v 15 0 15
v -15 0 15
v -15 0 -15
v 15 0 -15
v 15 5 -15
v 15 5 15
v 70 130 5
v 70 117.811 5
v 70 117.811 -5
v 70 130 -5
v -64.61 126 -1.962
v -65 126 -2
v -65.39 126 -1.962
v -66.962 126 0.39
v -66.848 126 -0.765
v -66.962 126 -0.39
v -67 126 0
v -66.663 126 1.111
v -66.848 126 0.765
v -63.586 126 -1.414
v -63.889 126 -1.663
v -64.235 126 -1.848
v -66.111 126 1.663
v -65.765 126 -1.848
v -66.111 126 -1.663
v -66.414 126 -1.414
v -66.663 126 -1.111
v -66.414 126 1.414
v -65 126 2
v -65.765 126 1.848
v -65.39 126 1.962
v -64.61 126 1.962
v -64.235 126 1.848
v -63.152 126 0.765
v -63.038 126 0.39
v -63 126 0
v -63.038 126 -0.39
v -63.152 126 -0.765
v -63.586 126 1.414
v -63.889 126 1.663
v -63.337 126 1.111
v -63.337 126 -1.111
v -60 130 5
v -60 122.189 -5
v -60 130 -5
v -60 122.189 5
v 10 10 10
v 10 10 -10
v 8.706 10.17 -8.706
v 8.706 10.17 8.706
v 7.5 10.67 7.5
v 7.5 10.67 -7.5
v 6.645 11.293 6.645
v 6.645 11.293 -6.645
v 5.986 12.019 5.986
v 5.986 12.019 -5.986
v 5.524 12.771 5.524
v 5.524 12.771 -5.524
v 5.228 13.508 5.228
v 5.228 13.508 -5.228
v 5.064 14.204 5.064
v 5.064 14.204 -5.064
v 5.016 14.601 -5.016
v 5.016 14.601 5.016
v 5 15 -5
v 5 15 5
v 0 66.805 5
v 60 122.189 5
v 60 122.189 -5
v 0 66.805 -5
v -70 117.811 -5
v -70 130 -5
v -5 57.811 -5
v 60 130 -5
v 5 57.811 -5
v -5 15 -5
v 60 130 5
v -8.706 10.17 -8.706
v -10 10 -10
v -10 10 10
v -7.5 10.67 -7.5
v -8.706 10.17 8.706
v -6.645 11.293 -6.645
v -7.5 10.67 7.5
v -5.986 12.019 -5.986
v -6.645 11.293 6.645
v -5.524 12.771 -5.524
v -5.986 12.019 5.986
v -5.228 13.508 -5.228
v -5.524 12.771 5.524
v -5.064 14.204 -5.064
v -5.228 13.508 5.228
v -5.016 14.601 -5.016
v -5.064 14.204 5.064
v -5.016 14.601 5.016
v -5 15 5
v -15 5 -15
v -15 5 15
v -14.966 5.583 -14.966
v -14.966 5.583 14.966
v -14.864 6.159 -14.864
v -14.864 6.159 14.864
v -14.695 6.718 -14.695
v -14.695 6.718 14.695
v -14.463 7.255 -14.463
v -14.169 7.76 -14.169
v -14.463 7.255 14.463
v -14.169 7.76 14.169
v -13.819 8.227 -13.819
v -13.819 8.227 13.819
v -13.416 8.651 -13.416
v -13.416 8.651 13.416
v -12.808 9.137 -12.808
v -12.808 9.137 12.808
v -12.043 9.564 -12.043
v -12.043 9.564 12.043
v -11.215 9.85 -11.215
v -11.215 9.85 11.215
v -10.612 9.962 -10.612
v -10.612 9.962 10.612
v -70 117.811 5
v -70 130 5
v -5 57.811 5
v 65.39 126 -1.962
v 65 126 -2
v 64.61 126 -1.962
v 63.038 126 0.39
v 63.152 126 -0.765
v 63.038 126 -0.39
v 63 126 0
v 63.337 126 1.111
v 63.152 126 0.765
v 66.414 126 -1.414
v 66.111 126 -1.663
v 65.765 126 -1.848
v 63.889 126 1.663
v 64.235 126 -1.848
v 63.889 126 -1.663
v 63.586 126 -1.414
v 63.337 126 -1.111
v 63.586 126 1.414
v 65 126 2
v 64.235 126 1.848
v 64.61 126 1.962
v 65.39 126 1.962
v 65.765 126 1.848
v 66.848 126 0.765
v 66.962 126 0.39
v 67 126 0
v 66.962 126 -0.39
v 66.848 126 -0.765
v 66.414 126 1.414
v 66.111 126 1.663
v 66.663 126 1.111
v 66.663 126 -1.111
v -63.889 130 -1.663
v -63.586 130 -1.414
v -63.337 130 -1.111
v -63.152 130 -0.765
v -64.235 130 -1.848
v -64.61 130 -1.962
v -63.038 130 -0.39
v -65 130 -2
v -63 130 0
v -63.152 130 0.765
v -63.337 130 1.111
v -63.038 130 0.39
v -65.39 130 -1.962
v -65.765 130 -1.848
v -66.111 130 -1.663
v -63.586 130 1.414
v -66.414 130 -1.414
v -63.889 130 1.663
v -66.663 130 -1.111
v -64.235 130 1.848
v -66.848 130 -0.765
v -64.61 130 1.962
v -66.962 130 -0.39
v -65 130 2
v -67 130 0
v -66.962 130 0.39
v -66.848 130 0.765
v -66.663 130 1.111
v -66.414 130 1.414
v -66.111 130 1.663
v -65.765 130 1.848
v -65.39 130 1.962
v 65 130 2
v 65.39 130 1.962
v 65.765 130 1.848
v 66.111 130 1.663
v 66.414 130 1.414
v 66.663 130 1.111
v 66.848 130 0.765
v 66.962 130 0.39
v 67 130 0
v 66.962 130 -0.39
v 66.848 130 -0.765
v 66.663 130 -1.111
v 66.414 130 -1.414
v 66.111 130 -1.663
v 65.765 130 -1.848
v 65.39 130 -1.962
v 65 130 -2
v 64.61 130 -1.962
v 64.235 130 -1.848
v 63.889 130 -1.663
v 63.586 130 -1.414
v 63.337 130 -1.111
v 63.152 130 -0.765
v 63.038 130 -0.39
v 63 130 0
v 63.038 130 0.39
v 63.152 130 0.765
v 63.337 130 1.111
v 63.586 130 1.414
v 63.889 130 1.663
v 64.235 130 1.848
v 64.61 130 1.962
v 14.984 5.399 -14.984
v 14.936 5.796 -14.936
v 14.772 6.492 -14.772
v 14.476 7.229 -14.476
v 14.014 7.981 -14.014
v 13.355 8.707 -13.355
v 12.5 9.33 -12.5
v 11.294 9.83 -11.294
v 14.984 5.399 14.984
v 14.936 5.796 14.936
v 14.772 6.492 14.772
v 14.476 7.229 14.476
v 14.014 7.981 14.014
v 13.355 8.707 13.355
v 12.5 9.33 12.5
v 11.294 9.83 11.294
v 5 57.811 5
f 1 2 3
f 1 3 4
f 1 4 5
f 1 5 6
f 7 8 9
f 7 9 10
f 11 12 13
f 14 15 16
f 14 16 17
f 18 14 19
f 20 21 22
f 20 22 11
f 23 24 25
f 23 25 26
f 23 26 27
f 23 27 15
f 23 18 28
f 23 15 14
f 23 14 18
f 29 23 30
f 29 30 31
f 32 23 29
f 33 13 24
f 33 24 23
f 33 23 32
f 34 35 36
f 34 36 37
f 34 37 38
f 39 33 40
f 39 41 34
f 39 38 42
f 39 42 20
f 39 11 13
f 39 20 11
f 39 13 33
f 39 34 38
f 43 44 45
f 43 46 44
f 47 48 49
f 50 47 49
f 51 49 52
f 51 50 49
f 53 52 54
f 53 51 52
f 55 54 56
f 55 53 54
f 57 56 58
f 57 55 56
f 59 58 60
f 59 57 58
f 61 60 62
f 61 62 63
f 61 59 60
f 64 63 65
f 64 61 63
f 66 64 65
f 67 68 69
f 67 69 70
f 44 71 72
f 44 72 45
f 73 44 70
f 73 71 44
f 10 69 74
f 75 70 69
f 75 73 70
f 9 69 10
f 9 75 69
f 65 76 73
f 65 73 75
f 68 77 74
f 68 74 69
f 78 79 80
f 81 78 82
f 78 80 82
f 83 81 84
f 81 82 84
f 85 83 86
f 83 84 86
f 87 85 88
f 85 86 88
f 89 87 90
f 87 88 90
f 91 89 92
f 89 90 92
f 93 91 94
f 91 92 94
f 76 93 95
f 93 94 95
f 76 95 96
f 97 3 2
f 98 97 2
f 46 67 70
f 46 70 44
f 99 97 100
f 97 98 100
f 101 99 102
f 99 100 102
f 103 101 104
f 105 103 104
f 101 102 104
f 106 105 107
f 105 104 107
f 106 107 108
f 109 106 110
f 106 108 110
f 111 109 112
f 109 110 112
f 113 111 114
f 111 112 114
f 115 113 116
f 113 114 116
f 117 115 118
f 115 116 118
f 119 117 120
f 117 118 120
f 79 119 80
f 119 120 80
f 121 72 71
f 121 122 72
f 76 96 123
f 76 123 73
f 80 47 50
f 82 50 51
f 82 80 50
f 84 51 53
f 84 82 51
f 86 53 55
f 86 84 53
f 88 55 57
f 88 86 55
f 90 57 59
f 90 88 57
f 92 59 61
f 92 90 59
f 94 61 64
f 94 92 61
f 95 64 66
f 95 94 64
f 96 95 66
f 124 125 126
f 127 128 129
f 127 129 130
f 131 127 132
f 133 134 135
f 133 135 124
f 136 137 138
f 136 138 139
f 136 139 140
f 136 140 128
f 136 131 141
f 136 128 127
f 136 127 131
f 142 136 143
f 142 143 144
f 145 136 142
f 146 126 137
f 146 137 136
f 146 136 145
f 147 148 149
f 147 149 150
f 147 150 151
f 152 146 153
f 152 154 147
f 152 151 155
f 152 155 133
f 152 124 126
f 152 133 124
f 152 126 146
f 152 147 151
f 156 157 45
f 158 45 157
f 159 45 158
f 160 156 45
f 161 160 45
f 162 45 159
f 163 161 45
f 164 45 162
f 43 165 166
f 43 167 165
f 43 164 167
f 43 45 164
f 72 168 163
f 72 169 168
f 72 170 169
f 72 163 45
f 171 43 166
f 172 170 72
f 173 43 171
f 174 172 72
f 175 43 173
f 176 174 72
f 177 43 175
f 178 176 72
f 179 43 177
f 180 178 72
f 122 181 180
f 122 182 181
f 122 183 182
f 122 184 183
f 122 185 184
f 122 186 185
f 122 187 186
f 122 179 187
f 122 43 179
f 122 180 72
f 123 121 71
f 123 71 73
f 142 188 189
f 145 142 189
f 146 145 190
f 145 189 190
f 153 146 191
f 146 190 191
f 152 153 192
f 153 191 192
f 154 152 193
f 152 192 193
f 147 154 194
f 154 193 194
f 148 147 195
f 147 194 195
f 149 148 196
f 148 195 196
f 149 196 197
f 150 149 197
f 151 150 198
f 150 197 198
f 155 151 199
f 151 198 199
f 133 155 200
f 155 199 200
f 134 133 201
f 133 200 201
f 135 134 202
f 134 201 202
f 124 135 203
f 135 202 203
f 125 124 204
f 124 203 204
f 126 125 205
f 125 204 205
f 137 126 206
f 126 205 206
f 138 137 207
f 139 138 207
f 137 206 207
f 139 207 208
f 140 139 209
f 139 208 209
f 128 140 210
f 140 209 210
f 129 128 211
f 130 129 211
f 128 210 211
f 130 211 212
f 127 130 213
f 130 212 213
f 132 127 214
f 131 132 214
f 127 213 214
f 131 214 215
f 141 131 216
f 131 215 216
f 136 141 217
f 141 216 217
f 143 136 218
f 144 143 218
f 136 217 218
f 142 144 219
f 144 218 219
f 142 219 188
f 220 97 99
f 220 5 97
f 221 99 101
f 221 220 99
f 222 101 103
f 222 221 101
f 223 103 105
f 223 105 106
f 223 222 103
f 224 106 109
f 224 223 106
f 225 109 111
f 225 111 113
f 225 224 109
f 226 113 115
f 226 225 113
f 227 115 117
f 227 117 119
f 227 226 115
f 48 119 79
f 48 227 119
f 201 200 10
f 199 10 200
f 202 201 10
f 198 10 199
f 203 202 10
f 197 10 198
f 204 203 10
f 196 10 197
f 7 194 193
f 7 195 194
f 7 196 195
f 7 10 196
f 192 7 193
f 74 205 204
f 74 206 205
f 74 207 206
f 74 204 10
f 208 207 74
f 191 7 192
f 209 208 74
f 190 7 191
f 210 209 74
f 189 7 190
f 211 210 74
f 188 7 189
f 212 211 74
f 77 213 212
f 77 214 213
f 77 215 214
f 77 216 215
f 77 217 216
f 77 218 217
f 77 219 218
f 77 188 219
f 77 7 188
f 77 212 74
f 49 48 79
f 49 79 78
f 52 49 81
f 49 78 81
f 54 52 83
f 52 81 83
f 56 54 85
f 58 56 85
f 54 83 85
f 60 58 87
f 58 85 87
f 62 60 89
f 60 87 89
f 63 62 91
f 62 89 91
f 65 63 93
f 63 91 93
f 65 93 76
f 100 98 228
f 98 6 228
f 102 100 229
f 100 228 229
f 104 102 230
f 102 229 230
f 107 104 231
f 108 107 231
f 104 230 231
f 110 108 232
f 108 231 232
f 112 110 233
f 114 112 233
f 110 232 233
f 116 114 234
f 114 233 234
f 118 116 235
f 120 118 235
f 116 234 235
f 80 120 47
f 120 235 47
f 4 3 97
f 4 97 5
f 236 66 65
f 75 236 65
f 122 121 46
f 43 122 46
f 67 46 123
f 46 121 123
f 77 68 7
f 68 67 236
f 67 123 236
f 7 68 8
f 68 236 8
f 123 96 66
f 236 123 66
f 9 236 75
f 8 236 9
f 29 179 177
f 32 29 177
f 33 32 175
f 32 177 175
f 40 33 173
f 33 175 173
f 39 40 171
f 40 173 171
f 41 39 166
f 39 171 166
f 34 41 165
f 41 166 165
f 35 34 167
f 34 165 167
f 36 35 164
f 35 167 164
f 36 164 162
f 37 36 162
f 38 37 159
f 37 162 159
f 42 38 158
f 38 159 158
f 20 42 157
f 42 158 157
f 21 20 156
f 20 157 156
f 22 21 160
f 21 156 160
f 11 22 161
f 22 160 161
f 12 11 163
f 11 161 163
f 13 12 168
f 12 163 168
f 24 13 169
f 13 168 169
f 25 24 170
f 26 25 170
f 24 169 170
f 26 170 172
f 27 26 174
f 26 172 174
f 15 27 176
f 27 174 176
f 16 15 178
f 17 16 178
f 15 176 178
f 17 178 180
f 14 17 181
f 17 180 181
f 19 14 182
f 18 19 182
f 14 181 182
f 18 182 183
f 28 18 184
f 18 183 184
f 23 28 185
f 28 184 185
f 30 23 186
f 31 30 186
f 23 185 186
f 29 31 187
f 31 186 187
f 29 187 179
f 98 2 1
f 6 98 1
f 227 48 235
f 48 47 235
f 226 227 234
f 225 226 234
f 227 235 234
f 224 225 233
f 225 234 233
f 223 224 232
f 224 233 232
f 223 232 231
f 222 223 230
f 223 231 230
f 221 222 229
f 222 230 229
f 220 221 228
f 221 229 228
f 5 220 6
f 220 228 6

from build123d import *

# Parameters (mm, degrees)
BOSS_EXTRUDE3_DEPTH = 5
SKETCH32_W          = 10
SKETCH32_H          = 10
BOSS_EXTRUDE5_DEPTH = 57.810843841
SKETCH33_W          = 30
SKETCH33_H          = 30
BOSS_EXTRUDE6_DEPTH = 10
FILLET2_R           = 5
SKETCH34_R          = 2
CUT_EXTRUDE2_DEPTH  = 4


with BuildPart() as part:
    # Sketch11 → Boss-Extrude3 (new, symmetric)
    with BuildSketch(Plane.XY):
        Polygon((-70, 130), (-70, 117.810843841), (0, 53.195459226), (70, 117.810843841), (70, 130), (60, 130), (60, 122.189156159), (0, 66.804540774), (-60, 122.189156159), (-60, 130), align=None)
    extrude(amount=BOSS_EXTRUDE3_DEPTH, both=True)

    # Sketch32 → Boss-Extrude5 (add)
    with BuildSketch(Plane(origin=(0, 0, 0), x_dir=(1, 0, 0), z_dir=(0, 1, 0))):
        Rectangle(SKETCH32_W, SKETCH32_H)
    extrude(amount=BOSS_EXTRUDE5_DEPTH)

    # Sketch33 → Boss-Extrude6 (add)
    with BuildSketch(Plane.XZ):
        Rectangle(SKETCH33_W, SKETCH33_H)
    extrude(amount=-BOSS_EXTRUDE6_DEPTH)

    # Fillet2
    fillet2_edges = [part.edges().sort_by_distance(p)[0] for p in [
        (-5, 10, 0),
        (0, 10, -5),
        (15, 10, 0),
        (0, 10, -15),
        (-15, 10, 0),
        (0, 10, 15),
        (0, 10, 5),
        (5, 10, 0),
    ]]
    fillet(fillet2_edges, radius=FILLET2_R - 0.0001)  # a hair under: the kernel refuses the full size

    # Sketch34 → Cut-Extrude2 (cut)
    with BuildSketch(Plane(origin=(0, 130, 0), x_dir=(1, 0, 0), z_dir=(0, 1, 0))):
        with Locations(Location((-65, 0, 0), (0, 0, 270))):
            Circle(SKETCH34_R)
        with Locations(Location((65, 0, 0), (0, 0, 270))):
            Circle(SKETCH34_R)
    extrude(amount=-CUT_EXTRUDE2_DEPTH, mode=Mode.SUBTRACT)


solid = part.part
